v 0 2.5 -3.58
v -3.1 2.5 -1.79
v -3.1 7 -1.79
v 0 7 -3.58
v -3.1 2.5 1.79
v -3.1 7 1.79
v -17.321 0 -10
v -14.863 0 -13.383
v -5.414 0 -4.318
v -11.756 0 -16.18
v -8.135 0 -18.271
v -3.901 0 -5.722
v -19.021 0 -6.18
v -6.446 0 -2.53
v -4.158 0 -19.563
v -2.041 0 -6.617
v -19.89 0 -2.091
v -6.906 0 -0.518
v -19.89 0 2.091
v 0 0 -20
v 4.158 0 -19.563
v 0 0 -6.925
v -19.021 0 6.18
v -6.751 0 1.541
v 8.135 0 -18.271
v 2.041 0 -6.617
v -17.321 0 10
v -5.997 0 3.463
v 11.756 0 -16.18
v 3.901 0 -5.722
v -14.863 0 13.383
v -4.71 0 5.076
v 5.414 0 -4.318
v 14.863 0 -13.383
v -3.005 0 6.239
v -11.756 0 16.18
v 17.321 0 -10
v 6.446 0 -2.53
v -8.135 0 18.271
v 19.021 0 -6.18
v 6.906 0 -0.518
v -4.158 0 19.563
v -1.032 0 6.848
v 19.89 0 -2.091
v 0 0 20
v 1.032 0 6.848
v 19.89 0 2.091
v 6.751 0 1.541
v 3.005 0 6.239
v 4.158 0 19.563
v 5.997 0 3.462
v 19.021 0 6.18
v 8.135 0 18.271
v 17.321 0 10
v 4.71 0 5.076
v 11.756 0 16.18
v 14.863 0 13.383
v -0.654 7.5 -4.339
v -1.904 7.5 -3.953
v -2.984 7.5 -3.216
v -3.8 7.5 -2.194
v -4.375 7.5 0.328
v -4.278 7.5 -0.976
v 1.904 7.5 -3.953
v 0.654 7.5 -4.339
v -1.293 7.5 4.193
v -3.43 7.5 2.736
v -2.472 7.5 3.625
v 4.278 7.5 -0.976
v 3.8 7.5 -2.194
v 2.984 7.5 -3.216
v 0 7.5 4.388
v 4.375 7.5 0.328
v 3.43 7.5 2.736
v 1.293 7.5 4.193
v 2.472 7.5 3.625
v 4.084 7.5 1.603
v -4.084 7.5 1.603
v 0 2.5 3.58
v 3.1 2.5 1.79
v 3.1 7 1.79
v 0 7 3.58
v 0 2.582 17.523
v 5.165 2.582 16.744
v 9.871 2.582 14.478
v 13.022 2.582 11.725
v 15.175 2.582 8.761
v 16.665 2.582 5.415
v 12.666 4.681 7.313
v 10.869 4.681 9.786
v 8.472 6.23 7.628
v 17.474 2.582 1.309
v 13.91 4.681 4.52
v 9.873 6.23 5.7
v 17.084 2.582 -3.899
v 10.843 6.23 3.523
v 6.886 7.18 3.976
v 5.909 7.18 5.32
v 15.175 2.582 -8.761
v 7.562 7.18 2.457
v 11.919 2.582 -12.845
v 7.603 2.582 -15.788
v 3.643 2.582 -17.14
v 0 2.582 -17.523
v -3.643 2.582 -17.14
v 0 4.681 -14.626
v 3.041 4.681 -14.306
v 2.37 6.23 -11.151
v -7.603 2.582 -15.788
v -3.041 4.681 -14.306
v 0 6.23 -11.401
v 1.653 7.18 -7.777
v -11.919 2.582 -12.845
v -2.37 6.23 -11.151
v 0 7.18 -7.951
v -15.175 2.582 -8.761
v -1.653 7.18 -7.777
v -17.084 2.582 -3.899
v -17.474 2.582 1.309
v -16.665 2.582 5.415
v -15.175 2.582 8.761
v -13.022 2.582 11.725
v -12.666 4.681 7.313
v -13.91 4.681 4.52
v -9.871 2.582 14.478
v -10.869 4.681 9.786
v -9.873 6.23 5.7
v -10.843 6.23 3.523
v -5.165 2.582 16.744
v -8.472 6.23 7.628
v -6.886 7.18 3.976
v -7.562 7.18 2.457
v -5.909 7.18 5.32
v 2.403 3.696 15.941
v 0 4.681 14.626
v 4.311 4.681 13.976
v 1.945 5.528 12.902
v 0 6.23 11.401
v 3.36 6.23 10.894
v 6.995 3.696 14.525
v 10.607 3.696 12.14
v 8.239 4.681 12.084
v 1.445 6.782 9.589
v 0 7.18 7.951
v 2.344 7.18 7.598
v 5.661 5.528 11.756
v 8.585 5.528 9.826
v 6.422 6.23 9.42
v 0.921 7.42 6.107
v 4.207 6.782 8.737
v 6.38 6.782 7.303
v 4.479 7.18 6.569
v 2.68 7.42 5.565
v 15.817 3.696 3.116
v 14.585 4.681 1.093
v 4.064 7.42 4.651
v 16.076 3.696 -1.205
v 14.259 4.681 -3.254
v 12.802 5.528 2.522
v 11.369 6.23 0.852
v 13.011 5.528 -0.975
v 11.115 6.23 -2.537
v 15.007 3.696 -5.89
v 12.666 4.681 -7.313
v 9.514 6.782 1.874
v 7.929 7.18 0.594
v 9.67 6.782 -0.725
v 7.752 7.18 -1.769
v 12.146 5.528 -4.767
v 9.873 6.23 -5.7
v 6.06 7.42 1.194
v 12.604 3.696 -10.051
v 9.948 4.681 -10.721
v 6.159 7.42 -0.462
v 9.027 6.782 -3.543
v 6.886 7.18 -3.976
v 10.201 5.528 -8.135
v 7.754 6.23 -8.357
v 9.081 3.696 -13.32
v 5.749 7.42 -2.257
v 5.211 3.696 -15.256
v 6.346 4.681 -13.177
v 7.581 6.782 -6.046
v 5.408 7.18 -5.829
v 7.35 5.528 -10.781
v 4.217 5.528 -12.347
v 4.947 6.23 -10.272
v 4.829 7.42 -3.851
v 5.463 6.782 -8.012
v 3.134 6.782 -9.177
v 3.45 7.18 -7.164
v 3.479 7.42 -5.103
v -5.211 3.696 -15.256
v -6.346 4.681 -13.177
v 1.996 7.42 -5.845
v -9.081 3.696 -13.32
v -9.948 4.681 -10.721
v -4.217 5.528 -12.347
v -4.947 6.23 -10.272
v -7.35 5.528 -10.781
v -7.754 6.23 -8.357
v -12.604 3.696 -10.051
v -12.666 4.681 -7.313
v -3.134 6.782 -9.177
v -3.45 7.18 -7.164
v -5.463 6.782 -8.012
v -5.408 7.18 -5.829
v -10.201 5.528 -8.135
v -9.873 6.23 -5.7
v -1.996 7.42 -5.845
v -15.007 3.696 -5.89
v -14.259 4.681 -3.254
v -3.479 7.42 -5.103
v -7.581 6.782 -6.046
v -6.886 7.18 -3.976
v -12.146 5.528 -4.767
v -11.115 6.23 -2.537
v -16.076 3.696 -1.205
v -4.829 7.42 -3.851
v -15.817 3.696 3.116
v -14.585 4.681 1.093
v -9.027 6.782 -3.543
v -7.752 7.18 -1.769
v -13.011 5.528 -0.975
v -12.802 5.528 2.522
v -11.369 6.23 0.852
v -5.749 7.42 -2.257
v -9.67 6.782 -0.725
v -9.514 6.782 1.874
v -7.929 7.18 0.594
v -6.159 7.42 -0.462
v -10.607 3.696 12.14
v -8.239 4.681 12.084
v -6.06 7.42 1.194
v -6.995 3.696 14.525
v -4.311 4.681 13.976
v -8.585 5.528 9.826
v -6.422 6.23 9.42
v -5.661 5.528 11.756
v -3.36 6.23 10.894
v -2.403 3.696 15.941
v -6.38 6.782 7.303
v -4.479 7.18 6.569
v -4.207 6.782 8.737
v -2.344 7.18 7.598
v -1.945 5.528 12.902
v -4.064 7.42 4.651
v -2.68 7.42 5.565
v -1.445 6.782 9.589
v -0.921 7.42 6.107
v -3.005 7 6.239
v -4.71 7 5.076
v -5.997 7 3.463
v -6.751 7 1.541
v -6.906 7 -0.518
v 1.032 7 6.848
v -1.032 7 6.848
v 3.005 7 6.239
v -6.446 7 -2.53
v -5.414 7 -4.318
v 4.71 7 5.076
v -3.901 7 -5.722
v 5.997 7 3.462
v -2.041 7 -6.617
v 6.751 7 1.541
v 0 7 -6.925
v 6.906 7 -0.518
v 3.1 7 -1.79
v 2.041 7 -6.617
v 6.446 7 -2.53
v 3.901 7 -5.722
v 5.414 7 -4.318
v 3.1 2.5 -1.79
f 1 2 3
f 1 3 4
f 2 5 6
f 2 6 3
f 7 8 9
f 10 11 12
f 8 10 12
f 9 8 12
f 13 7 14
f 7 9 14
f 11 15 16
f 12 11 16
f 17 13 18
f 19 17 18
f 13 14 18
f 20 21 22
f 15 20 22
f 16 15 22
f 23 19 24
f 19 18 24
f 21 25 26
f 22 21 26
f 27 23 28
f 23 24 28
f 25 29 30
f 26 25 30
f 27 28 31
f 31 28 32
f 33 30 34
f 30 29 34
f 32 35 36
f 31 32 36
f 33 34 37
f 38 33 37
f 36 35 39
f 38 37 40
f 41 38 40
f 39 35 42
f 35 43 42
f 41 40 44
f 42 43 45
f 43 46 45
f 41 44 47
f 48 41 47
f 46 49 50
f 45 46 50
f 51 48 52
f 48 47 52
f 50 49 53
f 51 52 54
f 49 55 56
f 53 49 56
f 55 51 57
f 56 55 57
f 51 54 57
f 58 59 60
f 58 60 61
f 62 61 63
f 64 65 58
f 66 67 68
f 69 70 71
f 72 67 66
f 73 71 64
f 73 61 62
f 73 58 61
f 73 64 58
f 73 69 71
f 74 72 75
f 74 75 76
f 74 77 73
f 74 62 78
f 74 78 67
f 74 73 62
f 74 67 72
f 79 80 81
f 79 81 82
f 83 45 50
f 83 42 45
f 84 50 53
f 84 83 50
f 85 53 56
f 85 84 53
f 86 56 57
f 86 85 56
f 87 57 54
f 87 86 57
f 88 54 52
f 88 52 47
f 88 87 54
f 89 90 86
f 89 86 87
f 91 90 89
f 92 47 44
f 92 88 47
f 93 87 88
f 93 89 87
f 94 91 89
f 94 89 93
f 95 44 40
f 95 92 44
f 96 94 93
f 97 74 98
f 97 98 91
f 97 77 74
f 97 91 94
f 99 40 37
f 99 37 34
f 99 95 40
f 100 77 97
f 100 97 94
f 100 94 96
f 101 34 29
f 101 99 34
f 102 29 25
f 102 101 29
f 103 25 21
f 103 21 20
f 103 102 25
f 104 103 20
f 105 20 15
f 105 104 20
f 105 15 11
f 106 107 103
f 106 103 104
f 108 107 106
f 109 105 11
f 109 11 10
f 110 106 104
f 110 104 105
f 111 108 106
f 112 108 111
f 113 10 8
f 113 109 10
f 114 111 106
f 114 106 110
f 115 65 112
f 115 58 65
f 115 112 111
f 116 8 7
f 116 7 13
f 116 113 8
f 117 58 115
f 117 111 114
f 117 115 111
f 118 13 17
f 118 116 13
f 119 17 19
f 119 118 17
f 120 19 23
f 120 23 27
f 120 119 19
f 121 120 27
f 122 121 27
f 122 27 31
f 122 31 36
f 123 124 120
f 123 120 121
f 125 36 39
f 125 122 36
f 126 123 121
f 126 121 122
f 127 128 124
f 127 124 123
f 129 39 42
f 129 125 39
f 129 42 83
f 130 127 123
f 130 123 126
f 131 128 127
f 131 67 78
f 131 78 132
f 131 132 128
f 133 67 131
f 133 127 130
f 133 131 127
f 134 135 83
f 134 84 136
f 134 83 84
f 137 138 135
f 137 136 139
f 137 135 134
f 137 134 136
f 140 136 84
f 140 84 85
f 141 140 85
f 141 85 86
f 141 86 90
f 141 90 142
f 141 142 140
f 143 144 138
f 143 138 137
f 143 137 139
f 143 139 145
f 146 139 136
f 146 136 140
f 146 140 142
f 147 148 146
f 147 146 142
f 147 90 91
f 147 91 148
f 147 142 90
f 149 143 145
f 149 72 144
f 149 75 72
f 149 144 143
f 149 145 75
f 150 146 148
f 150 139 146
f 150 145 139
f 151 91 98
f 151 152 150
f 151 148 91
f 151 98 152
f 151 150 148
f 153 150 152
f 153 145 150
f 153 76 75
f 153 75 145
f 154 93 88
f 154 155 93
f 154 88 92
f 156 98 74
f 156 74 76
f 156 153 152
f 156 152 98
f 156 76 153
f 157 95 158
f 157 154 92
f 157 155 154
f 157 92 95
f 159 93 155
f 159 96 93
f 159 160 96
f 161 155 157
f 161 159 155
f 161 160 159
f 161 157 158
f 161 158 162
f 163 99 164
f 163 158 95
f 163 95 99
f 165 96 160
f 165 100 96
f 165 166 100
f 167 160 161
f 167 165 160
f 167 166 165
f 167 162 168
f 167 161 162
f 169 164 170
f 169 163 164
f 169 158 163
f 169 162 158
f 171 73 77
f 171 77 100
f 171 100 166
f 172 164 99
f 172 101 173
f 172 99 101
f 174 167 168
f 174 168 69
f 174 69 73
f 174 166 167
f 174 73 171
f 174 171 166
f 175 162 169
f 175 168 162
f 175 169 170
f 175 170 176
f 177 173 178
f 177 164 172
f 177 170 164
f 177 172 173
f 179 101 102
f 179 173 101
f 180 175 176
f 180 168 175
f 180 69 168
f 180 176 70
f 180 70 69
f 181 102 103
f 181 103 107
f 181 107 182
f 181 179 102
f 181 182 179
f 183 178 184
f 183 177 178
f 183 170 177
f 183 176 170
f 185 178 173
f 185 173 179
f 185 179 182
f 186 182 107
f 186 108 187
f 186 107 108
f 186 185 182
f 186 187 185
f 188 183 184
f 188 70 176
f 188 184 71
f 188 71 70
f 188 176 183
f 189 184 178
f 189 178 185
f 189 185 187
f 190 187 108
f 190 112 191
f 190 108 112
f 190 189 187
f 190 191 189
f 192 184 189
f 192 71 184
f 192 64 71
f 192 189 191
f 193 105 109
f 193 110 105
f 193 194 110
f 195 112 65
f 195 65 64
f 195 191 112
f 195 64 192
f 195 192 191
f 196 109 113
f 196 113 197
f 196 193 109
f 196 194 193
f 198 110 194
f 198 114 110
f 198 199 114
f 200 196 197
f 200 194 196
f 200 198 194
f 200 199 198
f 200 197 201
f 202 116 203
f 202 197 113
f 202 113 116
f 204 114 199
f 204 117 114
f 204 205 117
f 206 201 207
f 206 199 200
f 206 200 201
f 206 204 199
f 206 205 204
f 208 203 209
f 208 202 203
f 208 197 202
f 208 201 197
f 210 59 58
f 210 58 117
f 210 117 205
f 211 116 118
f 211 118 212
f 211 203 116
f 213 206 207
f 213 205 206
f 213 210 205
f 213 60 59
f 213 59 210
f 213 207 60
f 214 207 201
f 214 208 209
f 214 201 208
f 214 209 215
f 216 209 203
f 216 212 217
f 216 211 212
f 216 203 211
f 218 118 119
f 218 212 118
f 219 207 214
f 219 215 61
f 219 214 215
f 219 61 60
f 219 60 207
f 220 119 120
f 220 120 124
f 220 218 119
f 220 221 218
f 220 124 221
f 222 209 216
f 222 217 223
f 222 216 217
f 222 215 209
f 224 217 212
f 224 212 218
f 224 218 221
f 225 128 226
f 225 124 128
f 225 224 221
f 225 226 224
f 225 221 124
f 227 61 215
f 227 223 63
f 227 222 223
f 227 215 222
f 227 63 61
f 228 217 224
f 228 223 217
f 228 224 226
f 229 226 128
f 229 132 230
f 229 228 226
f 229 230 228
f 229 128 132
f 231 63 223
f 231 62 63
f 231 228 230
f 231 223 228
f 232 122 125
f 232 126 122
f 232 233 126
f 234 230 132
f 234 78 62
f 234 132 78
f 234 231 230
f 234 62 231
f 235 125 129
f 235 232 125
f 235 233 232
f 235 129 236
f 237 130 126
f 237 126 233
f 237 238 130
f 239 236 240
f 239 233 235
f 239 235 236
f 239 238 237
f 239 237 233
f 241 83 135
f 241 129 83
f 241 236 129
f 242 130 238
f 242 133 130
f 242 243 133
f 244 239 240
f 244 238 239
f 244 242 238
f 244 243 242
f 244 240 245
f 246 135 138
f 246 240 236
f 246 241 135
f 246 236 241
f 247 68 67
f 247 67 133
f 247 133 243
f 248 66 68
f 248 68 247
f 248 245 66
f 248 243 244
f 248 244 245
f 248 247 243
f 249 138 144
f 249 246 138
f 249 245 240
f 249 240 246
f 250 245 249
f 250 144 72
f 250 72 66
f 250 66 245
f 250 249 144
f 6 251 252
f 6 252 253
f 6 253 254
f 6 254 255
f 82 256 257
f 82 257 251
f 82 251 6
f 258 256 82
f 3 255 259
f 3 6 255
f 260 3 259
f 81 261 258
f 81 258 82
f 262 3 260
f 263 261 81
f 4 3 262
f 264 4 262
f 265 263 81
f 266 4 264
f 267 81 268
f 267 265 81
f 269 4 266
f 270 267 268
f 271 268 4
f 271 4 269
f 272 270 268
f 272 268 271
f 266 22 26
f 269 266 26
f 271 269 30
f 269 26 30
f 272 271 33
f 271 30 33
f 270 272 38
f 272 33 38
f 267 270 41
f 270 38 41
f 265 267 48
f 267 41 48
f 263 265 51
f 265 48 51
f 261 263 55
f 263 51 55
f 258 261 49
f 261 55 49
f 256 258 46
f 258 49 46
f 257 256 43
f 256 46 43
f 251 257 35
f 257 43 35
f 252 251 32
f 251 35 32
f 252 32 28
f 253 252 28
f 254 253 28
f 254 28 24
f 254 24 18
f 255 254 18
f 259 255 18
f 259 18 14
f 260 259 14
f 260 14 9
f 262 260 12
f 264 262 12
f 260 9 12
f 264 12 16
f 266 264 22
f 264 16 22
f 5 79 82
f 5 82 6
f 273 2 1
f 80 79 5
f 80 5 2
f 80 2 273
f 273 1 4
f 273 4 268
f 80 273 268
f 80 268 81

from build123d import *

# Parameters (mm, degrees)
SKETCH1_R           = 20
BOSS_EXTRUDE1_DEPTH = 7.5
FILLET1_R           = 20
SKETCH2_R           = 6.925
CUT_EXTRUDE1_DEPTH  = 7
SKETCH3_R           = 4.558249482
CUT_EXTRUDE2_DEPTH  = 2.5


with BuildPart() as part:
    # Sketch1 → Boss-Extrude1 (new body)
    with BuildSketch(Plane(origin=(0, 0, 0), x_dir=(1, 0, 0), z_dir=(0, 1, 0))):
        with Locations(Location((0, 0, 0), (0, 0, 270))):
            Circle(SKETCH1_R)
    extrude(amount=BOSS_EXTRUDE1_DEPTH)

    # Fillet1
    # the kernel refuses this fillet: 20 mm, written as the material it takes off along each edge
    with BuildSketch(Plane(origin=(0, 7.5, 0), x_dir=(0, 0, 1), z_dir=(-1, 0, 0))) as fillet1_piece_1:
        with BuildLine():
            CenterArc((4.387505004, -20), FILLET1_R, 38.682187453, 51.317812547)
            Line((4.387505004, 0), (4.387505004, 0.4))
            Line((4.387505004, 0.4), (20, 0.4))
            Line((20, 0.4), (20.4, 0))
            ThreePointArc((20.4, 0), (20.4, -3.75), (20.3122499, -7.25))
            Line((20.3122499, -7.25), (20, -7.5))
        make_face()
    revolve(axis=Axis((0, 7.5, 0), (0, 1, 0)), mode=Mode.SUBTRACT)

    # Sketch2 → Cut-Extrude1 (cut)
    with BuildSketch(Plane.XZ):
        with Locations(Location((0, 0, 0), (0, 0, 270))):
            Circle(SKETCH2_R)
        Polygon((3.1, -1.789785834), (3.1, 1.789785834), (0, 3.579571669), (-3.1, 1.789785834), (-3.1, -1.789785834), (0, -3.579571669), align=None, mode=Mode.SUBTRACT)
    extrude(amount=-CUT_EXTRUDE1_DEPTH, mode=Mode.SUBTRACT)

    # Sketch3 → Cut-Extrude2 (cut)
    with BuildSketch(Plane.XZ):
        Circle(SKETCH3_R)
    extrude(amount=-CUT_EXTRUDE2_DEPTH, mode=Mode.SUBTRACT)


solid = part.part
